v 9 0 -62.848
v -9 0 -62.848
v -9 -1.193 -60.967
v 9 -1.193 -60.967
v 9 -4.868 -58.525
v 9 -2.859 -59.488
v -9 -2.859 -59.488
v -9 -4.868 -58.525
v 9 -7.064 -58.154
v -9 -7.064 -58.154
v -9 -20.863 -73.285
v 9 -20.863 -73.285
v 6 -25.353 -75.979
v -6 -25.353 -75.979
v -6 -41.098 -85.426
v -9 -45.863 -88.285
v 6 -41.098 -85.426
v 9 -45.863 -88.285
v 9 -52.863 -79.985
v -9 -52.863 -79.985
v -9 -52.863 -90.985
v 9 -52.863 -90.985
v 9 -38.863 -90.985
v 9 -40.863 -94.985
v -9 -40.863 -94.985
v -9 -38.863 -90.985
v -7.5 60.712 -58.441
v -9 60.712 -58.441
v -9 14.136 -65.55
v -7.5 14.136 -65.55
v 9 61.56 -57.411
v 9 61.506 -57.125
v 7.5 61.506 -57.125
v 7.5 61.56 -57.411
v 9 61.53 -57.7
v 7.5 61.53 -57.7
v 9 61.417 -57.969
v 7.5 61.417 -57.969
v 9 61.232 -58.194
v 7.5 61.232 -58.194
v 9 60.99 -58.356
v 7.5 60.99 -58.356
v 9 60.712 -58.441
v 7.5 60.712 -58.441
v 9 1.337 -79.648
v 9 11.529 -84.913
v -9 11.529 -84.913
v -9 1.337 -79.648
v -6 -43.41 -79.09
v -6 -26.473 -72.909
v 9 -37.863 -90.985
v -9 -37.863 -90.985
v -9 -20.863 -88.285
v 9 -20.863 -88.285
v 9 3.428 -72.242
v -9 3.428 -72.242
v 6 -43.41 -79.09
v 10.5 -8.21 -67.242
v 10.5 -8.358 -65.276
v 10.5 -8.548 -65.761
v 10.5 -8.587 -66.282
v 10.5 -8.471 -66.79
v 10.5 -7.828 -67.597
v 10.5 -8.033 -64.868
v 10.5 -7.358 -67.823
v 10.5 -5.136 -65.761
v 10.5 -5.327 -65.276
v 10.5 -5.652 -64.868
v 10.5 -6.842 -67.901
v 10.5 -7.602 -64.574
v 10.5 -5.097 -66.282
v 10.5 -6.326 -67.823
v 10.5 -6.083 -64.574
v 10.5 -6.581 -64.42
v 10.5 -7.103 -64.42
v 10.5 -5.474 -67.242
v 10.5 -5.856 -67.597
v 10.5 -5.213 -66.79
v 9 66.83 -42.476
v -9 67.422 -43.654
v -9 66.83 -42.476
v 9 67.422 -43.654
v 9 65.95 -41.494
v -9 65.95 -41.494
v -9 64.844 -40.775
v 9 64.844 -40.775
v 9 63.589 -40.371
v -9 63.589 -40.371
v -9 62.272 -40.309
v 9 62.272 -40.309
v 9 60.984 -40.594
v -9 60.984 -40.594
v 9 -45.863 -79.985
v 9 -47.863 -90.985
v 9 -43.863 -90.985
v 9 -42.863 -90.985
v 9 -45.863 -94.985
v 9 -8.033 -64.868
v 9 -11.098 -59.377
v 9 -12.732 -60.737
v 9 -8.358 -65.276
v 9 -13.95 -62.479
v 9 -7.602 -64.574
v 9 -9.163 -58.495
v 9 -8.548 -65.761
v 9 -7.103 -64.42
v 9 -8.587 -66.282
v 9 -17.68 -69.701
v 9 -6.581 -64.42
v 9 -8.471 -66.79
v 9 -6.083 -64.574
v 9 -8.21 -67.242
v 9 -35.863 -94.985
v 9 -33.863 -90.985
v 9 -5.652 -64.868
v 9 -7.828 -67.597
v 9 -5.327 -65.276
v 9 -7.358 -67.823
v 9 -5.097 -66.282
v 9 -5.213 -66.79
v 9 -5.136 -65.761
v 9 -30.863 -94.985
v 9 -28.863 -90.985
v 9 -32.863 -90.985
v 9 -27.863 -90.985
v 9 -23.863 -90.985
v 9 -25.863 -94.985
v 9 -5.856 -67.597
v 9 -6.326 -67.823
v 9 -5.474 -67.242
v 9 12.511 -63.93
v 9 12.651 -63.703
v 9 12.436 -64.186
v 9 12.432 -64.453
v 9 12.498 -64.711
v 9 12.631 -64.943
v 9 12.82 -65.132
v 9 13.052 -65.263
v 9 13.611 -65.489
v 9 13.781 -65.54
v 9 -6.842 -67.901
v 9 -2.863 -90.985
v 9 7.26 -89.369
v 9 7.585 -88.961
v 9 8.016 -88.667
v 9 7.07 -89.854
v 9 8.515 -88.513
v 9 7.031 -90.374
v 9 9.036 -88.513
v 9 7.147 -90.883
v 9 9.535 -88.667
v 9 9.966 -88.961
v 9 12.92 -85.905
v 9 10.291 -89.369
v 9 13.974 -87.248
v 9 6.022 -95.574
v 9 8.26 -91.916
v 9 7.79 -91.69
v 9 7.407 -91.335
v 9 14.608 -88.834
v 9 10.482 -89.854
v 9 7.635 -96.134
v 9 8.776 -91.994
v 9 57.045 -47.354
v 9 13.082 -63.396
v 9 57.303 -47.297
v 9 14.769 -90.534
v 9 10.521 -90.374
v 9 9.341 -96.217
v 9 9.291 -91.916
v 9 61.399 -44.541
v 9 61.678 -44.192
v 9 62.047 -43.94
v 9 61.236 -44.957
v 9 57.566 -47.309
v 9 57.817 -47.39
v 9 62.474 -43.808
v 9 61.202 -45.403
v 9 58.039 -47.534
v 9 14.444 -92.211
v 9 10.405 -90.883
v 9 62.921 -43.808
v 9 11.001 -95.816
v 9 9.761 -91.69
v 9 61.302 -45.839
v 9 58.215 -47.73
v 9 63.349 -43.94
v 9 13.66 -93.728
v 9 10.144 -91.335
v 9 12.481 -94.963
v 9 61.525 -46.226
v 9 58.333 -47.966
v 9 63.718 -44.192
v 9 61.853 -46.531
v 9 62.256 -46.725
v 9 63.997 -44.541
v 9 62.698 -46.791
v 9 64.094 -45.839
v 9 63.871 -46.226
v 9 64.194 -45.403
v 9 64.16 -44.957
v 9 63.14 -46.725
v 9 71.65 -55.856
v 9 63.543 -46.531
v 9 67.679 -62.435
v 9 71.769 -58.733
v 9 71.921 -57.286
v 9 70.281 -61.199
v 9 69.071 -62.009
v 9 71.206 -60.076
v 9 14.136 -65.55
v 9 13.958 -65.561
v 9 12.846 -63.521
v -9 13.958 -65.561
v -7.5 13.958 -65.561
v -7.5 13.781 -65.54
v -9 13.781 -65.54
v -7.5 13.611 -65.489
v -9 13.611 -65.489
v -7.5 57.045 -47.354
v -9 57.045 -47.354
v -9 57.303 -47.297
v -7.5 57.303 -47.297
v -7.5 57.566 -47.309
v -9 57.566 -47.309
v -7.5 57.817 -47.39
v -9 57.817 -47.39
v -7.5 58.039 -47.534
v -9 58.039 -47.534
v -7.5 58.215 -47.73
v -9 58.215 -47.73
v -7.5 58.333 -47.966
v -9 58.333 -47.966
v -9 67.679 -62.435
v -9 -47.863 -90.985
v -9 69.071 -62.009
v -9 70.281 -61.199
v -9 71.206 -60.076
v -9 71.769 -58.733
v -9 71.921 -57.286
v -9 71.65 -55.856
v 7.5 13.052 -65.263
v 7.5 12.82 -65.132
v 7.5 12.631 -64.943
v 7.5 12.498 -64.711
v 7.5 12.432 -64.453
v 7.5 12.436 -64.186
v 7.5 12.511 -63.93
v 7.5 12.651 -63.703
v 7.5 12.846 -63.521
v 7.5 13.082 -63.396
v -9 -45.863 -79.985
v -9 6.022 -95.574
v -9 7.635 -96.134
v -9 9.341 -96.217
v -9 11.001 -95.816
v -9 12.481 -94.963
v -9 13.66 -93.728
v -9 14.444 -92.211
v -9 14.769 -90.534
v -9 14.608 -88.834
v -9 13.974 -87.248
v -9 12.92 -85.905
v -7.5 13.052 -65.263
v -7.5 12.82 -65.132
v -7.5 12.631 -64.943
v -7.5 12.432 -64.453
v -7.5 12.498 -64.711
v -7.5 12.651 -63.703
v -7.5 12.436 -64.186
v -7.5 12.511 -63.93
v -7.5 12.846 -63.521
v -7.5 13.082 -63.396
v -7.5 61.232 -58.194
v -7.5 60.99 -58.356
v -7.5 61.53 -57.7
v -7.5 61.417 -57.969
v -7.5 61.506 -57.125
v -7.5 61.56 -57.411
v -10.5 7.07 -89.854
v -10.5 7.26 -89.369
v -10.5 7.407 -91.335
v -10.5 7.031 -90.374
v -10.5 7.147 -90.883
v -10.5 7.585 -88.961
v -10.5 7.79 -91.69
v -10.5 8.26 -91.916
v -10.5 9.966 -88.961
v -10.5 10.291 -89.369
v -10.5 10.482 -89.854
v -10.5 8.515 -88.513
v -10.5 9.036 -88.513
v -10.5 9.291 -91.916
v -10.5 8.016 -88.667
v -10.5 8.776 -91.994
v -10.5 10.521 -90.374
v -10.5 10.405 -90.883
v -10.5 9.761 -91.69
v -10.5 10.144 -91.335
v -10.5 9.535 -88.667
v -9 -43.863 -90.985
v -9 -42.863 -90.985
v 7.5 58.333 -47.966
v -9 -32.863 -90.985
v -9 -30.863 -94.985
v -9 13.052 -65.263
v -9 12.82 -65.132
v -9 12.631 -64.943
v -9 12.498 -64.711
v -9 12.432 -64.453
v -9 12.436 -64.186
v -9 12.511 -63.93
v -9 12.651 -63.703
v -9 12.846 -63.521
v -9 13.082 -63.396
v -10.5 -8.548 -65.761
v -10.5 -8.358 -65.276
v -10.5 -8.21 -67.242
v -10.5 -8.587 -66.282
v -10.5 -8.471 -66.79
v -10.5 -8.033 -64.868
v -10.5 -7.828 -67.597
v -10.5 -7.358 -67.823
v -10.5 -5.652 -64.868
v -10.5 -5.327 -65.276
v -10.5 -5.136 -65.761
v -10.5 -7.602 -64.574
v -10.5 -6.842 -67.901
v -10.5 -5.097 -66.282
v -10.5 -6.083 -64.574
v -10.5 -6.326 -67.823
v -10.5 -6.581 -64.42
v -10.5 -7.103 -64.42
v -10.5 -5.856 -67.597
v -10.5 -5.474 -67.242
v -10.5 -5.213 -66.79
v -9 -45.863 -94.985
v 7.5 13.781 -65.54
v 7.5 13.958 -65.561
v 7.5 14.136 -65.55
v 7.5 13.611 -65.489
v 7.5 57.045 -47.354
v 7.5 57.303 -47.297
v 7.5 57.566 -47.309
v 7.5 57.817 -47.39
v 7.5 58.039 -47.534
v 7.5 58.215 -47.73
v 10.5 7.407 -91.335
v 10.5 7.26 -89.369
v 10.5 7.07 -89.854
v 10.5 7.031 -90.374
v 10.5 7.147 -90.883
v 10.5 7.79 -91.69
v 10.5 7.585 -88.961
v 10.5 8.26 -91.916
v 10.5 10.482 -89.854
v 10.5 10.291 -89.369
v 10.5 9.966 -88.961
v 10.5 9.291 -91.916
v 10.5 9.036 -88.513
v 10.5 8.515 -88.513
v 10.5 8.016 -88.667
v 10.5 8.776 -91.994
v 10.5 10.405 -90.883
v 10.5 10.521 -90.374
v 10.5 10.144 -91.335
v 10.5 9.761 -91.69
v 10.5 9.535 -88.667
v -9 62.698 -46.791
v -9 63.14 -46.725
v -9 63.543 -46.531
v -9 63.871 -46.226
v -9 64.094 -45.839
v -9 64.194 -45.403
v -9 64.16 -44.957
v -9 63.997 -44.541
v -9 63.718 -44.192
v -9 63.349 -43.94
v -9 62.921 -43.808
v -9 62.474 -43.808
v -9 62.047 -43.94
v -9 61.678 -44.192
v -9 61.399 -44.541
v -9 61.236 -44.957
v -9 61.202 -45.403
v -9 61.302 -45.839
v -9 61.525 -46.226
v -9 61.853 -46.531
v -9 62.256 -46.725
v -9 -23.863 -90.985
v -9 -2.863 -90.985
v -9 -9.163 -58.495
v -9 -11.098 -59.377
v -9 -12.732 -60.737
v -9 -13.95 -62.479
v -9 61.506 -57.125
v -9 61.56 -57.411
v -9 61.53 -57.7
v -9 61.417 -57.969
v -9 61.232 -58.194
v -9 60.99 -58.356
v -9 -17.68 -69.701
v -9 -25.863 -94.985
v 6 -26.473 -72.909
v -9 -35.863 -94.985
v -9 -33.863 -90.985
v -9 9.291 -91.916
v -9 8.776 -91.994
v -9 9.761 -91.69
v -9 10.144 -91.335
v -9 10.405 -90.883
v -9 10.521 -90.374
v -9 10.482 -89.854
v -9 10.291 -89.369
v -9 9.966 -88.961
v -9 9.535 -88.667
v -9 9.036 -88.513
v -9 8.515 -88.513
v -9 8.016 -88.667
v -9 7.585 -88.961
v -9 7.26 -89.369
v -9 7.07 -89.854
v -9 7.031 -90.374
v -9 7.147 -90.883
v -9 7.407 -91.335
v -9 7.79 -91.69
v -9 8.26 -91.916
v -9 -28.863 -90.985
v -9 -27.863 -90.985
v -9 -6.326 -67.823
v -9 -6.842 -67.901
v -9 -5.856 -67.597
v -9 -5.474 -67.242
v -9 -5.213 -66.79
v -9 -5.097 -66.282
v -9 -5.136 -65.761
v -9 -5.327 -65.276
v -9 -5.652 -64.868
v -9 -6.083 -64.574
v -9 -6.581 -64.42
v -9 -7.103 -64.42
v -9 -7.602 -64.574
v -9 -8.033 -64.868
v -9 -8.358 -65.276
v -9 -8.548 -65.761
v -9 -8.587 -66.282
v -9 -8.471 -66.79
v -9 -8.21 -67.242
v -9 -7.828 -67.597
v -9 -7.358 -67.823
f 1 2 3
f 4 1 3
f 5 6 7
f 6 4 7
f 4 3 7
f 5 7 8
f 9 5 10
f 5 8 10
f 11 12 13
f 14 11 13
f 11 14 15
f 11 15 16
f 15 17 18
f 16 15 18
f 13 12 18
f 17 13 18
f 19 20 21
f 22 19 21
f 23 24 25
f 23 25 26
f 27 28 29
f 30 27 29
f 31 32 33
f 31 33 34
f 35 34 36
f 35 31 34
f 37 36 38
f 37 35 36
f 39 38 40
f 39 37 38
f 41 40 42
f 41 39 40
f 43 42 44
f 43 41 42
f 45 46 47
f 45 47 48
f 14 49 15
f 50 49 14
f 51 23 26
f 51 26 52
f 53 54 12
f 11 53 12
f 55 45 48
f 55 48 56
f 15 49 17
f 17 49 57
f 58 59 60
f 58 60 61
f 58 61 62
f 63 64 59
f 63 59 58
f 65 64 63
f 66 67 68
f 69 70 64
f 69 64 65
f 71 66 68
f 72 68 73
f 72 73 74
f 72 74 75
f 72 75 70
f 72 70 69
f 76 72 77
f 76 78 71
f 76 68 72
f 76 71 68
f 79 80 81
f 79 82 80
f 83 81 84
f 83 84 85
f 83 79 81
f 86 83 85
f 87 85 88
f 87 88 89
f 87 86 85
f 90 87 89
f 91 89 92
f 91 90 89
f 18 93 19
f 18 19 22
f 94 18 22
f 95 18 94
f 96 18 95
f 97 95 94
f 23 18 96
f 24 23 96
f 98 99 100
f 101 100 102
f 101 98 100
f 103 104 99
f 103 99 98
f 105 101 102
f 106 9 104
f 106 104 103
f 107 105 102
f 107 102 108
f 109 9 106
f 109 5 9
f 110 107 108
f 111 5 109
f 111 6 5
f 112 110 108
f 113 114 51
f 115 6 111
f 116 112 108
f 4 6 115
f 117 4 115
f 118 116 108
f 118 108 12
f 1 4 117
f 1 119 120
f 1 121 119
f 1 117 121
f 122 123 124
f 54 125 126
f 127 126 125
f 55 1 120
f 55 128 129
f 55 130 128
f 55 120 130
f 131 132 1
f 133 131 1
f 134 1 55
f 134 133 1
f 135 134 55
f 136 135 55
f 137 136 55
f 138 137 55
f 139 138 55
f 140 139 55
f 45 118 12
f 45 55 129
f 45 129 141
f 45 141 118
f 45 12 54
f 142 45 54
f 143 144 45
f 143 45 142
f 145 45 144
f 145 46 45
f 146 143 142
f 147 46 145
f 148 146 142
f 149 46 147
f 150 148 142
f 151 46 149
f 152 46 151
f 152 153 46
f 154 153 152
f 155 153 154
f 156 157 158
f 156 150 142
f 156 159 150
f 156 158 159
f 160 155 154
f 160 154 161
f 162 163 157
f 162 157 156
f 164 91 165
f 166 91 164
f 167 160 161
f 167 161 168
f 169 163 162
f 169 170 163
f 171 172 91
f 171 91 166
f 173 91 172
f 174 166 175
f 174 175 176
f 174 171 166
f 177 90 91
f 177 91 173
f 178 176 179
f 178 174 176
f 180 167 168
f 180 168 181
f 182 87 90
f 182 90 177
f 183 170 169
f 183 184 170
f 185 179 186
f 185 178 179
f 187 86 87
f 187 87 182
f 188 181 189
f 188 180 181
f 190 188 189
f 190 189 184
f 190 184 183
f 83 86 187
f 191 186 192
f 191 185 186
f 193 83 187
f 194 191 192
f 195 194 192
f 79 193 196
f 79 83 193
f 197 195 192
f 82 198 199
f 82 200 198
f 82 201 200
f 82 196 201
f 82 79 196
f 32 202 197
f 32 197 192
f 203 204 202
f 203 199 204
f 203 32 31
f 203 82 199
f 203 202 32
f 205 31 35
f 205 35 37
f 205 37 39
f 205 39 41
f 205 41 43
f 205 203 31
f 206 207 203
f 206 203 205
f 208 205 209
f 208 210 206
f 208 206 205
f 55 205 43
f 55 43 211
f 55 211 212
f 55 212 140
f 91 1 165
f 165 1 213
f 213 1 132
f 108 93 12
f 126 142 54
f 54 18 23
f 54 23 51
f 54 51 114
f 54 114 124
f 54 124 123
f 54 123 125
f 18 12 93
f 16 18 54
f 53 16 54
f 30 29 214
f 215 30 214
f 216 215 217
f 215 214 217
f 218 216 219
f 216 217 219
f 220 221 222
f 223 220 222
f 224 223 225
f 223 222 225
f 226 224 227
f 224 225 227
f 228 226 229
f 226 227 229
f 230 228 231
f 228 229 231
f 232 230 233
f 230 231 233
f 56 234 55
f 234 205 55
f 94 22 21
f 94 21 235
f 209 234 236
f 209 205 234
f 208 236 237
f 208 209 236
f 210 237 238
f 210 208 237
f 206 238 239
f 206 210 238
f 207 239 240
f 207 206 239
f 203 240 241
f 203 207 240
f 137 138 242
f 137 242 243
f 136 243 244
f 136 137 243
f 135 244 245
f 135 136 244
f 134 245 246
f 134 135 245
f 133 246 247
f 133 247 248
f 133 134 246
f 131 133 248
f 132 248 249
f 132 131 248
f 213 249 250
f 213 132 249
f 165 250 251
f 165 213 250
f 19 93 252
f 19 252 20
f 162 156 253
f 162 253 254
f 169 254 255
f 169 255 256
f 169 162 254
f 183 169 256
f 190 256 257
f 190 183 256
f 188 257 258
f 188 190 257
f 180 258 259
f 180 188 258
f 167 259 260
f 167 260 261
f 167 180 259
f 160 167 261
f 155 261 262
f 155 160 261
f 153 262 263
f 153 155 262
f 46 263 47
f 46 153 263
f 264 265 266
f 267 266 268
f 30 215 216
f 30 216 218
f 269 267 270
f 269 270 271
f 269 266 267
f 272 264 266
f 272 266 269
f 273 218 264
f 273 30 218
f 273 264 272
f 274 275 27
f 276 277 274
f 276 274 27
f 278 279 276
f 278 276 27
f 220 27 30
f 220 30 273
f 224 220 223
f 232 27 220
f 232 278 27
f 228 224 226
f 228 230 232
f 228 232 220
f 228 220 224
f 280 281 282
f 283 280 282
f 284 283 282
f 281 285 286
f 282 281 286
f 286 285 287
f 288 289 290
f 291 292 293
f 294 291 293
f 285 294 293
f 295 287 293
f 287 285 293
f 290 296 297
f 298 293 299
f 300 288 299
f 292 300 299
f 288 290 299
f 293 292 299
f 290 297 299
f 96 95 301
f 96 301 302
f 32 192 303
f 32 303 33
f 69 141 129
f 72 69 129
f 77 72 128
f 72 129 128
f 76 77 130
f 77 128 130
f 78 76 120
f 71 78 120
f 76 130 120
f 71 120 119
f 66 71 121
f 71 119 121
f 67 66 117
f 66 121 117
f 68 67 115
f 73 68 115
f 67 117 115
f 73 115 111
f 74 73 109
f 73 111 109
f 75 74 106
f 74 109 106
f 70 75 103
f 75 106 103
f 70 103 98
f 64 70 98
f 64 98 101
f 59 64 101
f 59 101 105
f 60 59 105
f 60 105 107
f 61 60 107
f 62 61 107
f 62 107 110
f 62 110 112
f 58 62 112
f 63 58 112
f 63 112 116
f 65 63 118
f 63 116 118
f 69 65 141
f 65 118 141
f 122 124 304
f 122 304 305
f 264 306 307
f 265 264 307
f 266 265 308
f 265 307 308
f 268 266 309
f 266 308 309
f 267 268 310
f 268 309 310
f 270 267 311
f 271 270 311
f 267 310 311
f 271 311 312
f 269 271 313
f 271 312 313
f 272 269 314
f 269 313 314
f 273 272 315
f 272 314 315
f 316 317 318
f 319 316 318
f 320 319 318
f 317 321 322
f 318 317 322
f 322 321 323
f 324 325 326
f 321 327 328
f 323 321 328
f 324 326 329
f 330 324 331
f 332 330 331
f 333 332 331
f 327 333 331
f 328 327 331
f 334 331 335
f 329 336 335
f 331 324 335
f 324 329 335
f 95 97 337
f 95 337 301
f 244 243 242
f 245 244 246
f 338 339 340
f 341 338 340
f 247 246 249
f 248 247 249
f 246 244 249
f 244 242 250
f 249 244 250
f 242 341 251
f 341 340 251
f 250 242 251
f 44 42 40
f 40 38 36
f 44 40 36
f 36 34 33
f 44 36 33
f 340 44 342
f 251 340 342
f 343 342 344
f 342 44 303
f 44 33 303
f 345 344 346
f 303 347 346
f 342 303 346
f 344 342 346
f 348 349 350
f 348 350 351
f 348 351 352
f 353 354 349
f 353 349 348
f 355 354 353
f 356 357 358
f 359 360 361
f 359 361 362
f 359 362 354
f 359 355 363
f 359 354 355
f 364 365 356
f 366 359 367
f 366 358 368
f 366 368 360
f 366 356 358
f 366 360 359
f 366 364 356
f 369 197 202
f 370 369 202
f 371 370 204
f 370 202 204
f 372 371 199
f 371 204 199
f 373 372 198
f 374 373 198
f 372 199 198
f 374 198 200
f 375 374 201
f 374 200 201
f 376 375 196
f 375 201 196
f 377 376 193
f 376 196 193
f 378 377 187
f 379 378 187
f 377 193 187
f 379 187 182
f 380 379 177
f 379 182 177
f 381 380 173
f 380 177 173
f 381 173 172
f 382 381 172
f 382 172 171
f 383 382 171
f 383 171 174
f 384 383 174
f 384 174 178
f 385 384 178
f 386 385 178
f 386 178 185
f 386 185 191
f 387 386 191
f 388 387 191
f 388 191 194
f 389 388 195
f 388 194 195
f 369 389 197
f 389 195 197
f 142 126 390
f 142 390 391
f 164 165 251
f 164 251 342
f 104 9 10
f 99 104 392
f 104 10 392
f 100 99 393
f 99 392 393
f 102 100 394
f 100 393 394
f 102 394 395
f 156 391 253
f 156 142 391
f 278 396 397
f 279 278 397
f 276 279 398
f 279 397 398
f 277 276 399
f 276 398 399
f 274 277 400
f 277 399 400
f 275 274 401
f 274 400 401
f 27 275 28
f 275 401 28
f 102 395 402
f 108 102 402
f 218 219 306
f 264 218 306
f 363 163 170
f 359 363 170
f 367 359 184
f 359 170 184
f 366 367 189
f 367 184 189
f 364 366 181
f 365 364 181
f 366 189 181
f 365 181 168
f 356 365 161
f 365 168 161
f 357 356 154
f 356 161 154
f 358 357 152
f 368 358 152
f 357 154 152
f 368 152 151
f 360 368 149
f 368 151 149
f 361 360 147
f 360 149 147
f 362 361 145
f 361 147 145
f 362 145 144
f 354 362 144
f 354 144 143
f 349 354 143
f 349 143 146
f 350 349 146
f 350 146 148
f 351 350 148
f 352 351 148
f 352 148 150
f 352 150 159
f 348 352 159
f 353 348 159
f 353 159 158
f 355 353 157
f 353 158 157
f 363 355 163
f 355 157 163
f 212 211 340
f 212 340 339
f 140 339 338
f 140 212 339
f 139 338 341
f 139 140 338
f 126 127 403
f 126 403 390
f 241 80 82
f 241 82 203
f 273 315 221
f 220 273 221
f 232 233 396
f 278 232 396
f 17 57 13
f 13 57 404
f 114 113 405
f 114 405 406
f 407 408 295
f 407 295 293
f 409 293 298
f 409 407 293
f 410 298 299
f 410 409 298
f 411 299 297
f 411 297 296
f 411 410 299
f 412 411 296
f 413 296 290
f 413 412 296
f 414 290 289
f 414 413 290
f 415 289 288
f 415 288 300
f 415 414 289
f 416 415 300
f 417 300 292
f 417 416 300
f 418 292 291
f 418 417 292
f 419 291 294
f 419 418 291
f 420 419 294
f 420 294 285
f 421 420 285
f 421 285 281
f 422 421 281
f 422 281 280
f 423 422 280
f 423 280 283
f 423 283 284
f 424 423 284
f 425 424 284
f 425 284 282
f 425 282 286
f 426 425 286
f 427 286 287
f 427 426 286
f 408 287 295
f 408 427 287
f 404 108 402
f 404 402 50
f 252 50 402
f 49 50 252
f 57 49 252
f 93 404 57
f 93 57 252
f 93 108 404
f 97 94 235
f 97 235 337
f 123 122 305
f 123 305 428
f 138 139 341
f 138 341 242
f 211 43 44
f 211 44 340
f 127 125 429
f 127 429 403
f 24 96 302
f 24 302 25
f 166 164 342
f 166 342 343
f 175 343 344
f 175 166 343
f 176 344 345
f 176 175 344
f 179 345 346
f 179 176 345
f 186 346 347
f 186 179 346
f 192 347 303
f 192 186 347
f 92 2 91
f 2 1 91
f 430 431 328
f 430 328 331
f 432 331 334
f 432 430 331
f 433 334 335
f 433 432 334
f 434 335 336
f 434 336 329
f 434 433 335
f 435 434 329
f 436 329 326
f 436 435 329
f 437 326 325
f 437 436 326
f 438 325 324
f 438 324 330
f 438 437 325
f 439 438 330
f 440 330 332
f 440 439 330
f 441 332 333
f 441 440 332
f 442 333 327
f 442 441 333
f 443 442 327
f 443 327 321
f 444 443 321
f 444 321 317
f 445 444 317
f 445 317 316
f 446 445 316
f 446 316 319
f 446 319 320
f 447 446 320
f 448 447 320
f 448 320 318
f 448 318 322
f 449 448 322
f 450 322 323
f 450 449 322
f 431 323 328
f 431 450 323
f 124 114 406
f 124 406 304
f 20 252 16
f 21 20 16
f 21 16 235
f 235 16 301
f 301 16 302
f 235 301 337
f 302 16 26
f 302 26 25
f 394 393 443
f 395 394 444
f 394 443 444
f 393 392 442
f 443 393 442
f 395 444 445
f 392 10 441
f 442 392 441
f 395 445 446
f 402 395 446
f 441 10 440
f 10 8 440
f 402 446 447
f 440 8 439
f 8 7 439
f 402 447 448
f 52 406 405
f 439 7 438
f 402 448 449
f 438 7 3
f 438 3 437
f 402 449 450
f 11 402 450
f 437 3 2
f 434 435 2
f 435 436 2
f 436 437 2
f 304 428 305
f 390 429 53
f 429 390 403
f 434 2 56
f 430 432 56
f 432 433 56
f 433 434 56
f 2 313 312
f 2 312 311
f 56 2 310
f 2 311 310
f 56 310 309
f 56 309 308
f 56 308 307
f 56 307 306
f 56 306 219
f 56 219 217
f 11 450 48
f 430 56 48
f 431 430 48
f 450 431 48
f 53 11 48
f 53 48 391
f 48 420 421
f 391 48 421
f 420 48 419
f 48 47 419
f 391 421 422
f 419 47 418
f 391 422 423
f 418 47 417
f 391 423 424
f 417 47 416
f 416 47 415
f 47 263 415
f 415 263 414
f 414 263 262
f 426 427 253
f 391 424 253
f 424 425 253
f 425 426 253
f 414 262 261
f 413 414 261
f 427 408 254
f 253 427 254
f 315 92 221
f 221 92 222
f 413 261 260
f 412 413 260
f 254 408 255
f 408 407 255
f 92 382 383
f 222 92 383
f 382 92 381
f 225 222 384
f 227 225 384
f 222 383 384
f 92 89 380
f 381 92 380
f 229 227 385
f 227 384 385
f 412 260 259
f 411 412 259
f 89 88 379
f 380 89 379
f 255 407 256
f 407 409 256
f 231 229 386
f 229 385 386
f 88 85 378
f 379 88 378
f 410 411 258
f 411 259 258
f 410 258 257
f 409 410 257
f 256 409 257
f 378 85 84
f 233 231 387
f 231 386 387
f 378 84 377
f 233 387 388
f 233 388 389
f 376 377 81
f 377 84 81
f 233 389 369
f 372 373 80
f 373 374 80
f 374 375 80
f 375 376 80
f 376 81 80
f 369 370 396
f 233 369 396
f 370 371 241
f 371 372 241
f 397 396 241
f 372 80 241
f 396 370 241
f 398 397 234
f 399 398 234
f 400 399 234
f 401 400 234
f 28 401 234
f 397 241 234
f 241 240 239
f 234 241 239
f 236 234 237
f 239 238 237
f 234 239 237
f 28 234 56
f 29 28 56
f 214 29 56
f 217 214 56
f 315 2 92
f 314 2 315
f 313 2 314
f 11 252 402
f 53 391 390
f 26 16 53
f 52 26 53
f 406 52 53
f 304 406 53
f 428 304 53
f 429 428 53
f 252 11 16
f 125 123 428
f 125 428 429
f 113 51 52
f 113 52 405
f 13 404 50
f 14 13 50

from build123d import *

# Parameters (mm, degrees)
BOSS_EXTRUDE1_DEPTH = 9
CUT_EXTRUDE1_DEPTH  = 25
BOSS_EXTRUDE2_DEPTH = 18
LPATTERN1_COUNT     = 5
LPATTERN1_PITCH     = 5
FILLET2_R           = 5
FILLET3_R           = 8
SKETCH4_R           = 1.5
CUT_EXTRUDE2_DEPTH  = 18
SKETCH6_W           = 6
SKETCH6_H           = 18.02956864
CUT_EXTRUDE3_DEPTH  = 8
SKETCH7_R           = 1.75
BOSS_EXTRUDE3_DEPTH = 1.5
CUT_EXTRUDE8_DEPTH  = 1.5


with BuildPart() as part:
    # Sketch1 → Boss-Extrude1 (new, symmetric)
    with BuildSketch(Plane(origin=(0, 0, 0), x_dir=(0, 0, -1), z_dir=(1, 0, 0))):
        with BuildLine():
            Line((90.984883898, -2.862650195), (95.574427473, 6.021948264))
            ThreePointArc((95.574427473, 6.021948264), (92.997394543, 14.106433484), (84.912909322, 11.529400554))
            Line((84.912909322, 11.529400554), (79.647841616, 1.337098931))
            Line((79.647841616, 1.337098931), (72.241979914, 3.428014696))
            Line((72.241979914, 3.428014696), (62.847901181, 0))
            Line((62.847901181, 0), (58.150861814, -1.714007348))
            Line((58.150861814, -1.714007348), (58.150861814, -11.714007348))
            Line((58.150861814, -11.714007348), (69.700839811, -17.680413995))
            Line((69.700839811, -17.680413995), (79.984883898, -45.862650195))
            Line((79.984883898, -45.862650195), (79.984883898, -52.862650195))
            Line((79.984883898, -52.862650195), (90.984883898, -52.862650195))
            Line((90.984883898, -52.862650195), (90.984883898, -2.862650195))
        make_face()
        Polygon((72.241979914, 3.428014696), (62.847901181, 0), (38.851798311, 65.758551133), (61.529389306, 73.615195879), align=None)
    extrude(amount=BOSS_EXTRUDE1_DEPTH, both=True)

    # Sketch2 → Cut-Extrude1 (cut)
    with BuildSketch(Plane(origin=(9, 0, 0), x_dir=(0, 0, -1), z_dir=(1, 0, 0))):
        Polygon((88.284883898, -45.862650195), (88.284883898, -20.862650195), (73.284883898, -20.862650195), align=None)
    extrude(amount=-CUT_EXTRUDE1_DEPTH, mode=Mode.SUBTRACT)

    # Sketch3 → Boss-Extrude2 (add)
    with BuildSketch(Plane(origin=(9, 0, 0), x_dir=(0, 0, -1), z_dir=(1, 0, 0))):
        Polygon((94.984883898, -45.862650195), (90.984883898, -45.862650195), (90.984883898, -47.862650195), align=None)
        Polygon((90.984883898, -43.862650195), (90.984883898, -45.862650195), (94.984883898, -45.862650195), align=None)
    boss_extrude2 = extrude(amount=-BOSS_EXTRUDE2_DEPTH)

    # LPattern1: Boss-Extrude2 ×5
    with Locations(*[(0, i * LPATTERN1_PITCH, 0) for i in range(1, LPATTERN1_COUNT)]):
        add(boss_extrude2)

    # Fillet2
    fillet2_edges = [part.edges().sort_by_distance(p)[0] for p in [
        (0, 65.758551133, -38.851798311),
        (0, 73.615195879, -61.529389306),
    ]]
    fillet(fillet2_edges, radius=FILLET2_R)

    # Fillet3
    # the kernel refuses this fillet: 8 mm, written as the material it takes off along each edge
    with BuildSketch(Plane(origin=(-21.179405631, -11.714007348, -58.150861814), x_dir=(0, 1, 0), z_dir=(1, 0, 0))) as fillet3_piece_1:
        with BuildLine():
            CenterArc((FILLET3_R * 0.608970281556, -FILLET3_R), FILLET3_R, 90, 62.680345336)
            Line((-FILLET3_R * 0.279489564314, -FILLET3_R * 0.541045642491), (-FILLET3_R * 0.297258761231, -FILLET3_R * 0.531866555341))
            Line((-FILLET3_R * 0.297258761231, -FILLET3_R * 0.531866555341), (-FILLET3_R * 0.0121794056311, FILLET3_R * 0.02))
            Line((-FILLET3_R * 0.0121794056311, FILLET3_R * 0.02), (FILLET3_R * 0.608970281556, FILLET3_R * 0.02))
            Line((FILLET3_R * 0.608970281556, FILLET3_R * 0.02), (FILLET3_R * 0.608970281556, 0))
        make_face()
    extrude(amount=42.358811262, mode=Mode.SUBTRACT)
    with BuildSketch(Plane(origin=(-22.930780243, -1.714007348, -58.150861814), x_dir=(0, 0.34280146956229973, -0.9394078733254942), z_dir=(1, 0, 0))) as fillet3_piece_2:
        with BuildLine():
            CenterArc((5.605066211, -7.977085613), FILLET3_R, 94.33760972, 65.614743341)
            Line((-1.910196776, -5.234673857), (-2.060502036, -5.179825622))
            Line((-2.060502036, -5.179825622), (-0.15030526, 0.054848235))
            Line((-0.15030526, 0.054848235), (0, 0.16))
            ThreePointArc((0, 0.16), (2.5, 0.16), (4.987898676, 0.159541712))
            Line((4.987898676, 0.159541712), (5, 0))
        make_face()
    extrude(amount=45.861560486, mode=Mode.SUBTRACT)

    # Sketch4 → Cut-Extrude2 (cut)
    with BuildSketch(Plane(origin=(9, 0, 0), x_dir=(0, 0, -1), z_dir=(1, 0, 0))):
        with Locations((45.291168566, 62.697901722)):
            Circle(SKETCH4_R)
    extrude(amount=-CUT_EXTRUDE2_DEPTH, mode=Mode.SUBTRACT)

    # Sketch6 → Cut-Extrude3 (cut)
    with BuildSketch(Plane(origin=(0, 20.368113495, -55.816464867), x_dir=(1, 0, 0), z_dir=(0, -0.342801469564146, 0.9394078733248205))):
        with Locations((-3, -58.877510112)):
            Rectangle(SKETCH6_W, SKETCH6_H)
        with Locations((3, -58.877510112)):
            Rectangle(SKETCH6_W, SKETCH6_H)
    extrude(amount=-CUT_EXTRUDE3_DEPTH, mode=Mode.SUBTRACT)

    # Sketch7 → Boss-Extrude3 (add)
    with BuildSketch(Plane(origin=(9, 0, 0), x_dir=(0, 0, -1), z_dir=(1, 0, 0))):
        with Locations((90.243668397, 8.775674409)):
            Circle(SKETCH7_R)
        with Locations((66.150861814, -6.842245095)):
            Circle(SKETCH7_R)
    boss_extrude3 = extrude(amount=BOSS_EXTRUDE3_DEPTH)

    # Sketch9 → Cut-Extrude8 (cut)
    with BuildSketch(Plane(origin=(9, 0, 0), x_dir=(0, 0, -1), z_dir=(1, 0, 0))):
        with BuildLine():
            Line((58.440866419, 60.71212793), (65.549781573, 14.135652246))
            ThreePointArc((65.549781573, 14.135652246), (65.554544576, 13.869334092), (65.488833832, 13.611205938))
            Line((65.488833832, 13.611205938), (65.263485326, 13.051639762))
            ThreePointArc((65.263485326, 13.051639762), (64.319406176, 12.425340234), (63.396473347, 13.082403042))
            Line((63.396473347, 13.082403042), (47.353872306, 57.045300124))
            ThreePointArc((47.353872306, 57.045300124), (47.390108621, 57.817381382), (47.965919982, 58.333001219))
            Line((47.965919982, 58.333001219), (57.124954374, 61.506145996))
            ThreePointArc((57.124954374, 61.506145996), (57.968947683, 61.417453255), (58.440866419, 60.71212793))
        make_face()
    cut_extrude8 = extrude(amount=-CUT_EXTRUDE8_DEPTH, mode=Mode.SUBTRACT)

    # Mirror1: Boss-Extrude3, Cut-Extrude8 across plane
    add(boss_extrude3.mirror(Plane(origin=(0, 0, 0), x_dir=(0, 0, 1), z_dir=(1, 0, 0))))
    add(cut_extrude8.mirror(Plane(origin=(0, 0, 0), x_dir=(0, 0, 1), z_dir=(1, 0, 0))), mode=Mode.SUBTRACT)


solid = part.part
